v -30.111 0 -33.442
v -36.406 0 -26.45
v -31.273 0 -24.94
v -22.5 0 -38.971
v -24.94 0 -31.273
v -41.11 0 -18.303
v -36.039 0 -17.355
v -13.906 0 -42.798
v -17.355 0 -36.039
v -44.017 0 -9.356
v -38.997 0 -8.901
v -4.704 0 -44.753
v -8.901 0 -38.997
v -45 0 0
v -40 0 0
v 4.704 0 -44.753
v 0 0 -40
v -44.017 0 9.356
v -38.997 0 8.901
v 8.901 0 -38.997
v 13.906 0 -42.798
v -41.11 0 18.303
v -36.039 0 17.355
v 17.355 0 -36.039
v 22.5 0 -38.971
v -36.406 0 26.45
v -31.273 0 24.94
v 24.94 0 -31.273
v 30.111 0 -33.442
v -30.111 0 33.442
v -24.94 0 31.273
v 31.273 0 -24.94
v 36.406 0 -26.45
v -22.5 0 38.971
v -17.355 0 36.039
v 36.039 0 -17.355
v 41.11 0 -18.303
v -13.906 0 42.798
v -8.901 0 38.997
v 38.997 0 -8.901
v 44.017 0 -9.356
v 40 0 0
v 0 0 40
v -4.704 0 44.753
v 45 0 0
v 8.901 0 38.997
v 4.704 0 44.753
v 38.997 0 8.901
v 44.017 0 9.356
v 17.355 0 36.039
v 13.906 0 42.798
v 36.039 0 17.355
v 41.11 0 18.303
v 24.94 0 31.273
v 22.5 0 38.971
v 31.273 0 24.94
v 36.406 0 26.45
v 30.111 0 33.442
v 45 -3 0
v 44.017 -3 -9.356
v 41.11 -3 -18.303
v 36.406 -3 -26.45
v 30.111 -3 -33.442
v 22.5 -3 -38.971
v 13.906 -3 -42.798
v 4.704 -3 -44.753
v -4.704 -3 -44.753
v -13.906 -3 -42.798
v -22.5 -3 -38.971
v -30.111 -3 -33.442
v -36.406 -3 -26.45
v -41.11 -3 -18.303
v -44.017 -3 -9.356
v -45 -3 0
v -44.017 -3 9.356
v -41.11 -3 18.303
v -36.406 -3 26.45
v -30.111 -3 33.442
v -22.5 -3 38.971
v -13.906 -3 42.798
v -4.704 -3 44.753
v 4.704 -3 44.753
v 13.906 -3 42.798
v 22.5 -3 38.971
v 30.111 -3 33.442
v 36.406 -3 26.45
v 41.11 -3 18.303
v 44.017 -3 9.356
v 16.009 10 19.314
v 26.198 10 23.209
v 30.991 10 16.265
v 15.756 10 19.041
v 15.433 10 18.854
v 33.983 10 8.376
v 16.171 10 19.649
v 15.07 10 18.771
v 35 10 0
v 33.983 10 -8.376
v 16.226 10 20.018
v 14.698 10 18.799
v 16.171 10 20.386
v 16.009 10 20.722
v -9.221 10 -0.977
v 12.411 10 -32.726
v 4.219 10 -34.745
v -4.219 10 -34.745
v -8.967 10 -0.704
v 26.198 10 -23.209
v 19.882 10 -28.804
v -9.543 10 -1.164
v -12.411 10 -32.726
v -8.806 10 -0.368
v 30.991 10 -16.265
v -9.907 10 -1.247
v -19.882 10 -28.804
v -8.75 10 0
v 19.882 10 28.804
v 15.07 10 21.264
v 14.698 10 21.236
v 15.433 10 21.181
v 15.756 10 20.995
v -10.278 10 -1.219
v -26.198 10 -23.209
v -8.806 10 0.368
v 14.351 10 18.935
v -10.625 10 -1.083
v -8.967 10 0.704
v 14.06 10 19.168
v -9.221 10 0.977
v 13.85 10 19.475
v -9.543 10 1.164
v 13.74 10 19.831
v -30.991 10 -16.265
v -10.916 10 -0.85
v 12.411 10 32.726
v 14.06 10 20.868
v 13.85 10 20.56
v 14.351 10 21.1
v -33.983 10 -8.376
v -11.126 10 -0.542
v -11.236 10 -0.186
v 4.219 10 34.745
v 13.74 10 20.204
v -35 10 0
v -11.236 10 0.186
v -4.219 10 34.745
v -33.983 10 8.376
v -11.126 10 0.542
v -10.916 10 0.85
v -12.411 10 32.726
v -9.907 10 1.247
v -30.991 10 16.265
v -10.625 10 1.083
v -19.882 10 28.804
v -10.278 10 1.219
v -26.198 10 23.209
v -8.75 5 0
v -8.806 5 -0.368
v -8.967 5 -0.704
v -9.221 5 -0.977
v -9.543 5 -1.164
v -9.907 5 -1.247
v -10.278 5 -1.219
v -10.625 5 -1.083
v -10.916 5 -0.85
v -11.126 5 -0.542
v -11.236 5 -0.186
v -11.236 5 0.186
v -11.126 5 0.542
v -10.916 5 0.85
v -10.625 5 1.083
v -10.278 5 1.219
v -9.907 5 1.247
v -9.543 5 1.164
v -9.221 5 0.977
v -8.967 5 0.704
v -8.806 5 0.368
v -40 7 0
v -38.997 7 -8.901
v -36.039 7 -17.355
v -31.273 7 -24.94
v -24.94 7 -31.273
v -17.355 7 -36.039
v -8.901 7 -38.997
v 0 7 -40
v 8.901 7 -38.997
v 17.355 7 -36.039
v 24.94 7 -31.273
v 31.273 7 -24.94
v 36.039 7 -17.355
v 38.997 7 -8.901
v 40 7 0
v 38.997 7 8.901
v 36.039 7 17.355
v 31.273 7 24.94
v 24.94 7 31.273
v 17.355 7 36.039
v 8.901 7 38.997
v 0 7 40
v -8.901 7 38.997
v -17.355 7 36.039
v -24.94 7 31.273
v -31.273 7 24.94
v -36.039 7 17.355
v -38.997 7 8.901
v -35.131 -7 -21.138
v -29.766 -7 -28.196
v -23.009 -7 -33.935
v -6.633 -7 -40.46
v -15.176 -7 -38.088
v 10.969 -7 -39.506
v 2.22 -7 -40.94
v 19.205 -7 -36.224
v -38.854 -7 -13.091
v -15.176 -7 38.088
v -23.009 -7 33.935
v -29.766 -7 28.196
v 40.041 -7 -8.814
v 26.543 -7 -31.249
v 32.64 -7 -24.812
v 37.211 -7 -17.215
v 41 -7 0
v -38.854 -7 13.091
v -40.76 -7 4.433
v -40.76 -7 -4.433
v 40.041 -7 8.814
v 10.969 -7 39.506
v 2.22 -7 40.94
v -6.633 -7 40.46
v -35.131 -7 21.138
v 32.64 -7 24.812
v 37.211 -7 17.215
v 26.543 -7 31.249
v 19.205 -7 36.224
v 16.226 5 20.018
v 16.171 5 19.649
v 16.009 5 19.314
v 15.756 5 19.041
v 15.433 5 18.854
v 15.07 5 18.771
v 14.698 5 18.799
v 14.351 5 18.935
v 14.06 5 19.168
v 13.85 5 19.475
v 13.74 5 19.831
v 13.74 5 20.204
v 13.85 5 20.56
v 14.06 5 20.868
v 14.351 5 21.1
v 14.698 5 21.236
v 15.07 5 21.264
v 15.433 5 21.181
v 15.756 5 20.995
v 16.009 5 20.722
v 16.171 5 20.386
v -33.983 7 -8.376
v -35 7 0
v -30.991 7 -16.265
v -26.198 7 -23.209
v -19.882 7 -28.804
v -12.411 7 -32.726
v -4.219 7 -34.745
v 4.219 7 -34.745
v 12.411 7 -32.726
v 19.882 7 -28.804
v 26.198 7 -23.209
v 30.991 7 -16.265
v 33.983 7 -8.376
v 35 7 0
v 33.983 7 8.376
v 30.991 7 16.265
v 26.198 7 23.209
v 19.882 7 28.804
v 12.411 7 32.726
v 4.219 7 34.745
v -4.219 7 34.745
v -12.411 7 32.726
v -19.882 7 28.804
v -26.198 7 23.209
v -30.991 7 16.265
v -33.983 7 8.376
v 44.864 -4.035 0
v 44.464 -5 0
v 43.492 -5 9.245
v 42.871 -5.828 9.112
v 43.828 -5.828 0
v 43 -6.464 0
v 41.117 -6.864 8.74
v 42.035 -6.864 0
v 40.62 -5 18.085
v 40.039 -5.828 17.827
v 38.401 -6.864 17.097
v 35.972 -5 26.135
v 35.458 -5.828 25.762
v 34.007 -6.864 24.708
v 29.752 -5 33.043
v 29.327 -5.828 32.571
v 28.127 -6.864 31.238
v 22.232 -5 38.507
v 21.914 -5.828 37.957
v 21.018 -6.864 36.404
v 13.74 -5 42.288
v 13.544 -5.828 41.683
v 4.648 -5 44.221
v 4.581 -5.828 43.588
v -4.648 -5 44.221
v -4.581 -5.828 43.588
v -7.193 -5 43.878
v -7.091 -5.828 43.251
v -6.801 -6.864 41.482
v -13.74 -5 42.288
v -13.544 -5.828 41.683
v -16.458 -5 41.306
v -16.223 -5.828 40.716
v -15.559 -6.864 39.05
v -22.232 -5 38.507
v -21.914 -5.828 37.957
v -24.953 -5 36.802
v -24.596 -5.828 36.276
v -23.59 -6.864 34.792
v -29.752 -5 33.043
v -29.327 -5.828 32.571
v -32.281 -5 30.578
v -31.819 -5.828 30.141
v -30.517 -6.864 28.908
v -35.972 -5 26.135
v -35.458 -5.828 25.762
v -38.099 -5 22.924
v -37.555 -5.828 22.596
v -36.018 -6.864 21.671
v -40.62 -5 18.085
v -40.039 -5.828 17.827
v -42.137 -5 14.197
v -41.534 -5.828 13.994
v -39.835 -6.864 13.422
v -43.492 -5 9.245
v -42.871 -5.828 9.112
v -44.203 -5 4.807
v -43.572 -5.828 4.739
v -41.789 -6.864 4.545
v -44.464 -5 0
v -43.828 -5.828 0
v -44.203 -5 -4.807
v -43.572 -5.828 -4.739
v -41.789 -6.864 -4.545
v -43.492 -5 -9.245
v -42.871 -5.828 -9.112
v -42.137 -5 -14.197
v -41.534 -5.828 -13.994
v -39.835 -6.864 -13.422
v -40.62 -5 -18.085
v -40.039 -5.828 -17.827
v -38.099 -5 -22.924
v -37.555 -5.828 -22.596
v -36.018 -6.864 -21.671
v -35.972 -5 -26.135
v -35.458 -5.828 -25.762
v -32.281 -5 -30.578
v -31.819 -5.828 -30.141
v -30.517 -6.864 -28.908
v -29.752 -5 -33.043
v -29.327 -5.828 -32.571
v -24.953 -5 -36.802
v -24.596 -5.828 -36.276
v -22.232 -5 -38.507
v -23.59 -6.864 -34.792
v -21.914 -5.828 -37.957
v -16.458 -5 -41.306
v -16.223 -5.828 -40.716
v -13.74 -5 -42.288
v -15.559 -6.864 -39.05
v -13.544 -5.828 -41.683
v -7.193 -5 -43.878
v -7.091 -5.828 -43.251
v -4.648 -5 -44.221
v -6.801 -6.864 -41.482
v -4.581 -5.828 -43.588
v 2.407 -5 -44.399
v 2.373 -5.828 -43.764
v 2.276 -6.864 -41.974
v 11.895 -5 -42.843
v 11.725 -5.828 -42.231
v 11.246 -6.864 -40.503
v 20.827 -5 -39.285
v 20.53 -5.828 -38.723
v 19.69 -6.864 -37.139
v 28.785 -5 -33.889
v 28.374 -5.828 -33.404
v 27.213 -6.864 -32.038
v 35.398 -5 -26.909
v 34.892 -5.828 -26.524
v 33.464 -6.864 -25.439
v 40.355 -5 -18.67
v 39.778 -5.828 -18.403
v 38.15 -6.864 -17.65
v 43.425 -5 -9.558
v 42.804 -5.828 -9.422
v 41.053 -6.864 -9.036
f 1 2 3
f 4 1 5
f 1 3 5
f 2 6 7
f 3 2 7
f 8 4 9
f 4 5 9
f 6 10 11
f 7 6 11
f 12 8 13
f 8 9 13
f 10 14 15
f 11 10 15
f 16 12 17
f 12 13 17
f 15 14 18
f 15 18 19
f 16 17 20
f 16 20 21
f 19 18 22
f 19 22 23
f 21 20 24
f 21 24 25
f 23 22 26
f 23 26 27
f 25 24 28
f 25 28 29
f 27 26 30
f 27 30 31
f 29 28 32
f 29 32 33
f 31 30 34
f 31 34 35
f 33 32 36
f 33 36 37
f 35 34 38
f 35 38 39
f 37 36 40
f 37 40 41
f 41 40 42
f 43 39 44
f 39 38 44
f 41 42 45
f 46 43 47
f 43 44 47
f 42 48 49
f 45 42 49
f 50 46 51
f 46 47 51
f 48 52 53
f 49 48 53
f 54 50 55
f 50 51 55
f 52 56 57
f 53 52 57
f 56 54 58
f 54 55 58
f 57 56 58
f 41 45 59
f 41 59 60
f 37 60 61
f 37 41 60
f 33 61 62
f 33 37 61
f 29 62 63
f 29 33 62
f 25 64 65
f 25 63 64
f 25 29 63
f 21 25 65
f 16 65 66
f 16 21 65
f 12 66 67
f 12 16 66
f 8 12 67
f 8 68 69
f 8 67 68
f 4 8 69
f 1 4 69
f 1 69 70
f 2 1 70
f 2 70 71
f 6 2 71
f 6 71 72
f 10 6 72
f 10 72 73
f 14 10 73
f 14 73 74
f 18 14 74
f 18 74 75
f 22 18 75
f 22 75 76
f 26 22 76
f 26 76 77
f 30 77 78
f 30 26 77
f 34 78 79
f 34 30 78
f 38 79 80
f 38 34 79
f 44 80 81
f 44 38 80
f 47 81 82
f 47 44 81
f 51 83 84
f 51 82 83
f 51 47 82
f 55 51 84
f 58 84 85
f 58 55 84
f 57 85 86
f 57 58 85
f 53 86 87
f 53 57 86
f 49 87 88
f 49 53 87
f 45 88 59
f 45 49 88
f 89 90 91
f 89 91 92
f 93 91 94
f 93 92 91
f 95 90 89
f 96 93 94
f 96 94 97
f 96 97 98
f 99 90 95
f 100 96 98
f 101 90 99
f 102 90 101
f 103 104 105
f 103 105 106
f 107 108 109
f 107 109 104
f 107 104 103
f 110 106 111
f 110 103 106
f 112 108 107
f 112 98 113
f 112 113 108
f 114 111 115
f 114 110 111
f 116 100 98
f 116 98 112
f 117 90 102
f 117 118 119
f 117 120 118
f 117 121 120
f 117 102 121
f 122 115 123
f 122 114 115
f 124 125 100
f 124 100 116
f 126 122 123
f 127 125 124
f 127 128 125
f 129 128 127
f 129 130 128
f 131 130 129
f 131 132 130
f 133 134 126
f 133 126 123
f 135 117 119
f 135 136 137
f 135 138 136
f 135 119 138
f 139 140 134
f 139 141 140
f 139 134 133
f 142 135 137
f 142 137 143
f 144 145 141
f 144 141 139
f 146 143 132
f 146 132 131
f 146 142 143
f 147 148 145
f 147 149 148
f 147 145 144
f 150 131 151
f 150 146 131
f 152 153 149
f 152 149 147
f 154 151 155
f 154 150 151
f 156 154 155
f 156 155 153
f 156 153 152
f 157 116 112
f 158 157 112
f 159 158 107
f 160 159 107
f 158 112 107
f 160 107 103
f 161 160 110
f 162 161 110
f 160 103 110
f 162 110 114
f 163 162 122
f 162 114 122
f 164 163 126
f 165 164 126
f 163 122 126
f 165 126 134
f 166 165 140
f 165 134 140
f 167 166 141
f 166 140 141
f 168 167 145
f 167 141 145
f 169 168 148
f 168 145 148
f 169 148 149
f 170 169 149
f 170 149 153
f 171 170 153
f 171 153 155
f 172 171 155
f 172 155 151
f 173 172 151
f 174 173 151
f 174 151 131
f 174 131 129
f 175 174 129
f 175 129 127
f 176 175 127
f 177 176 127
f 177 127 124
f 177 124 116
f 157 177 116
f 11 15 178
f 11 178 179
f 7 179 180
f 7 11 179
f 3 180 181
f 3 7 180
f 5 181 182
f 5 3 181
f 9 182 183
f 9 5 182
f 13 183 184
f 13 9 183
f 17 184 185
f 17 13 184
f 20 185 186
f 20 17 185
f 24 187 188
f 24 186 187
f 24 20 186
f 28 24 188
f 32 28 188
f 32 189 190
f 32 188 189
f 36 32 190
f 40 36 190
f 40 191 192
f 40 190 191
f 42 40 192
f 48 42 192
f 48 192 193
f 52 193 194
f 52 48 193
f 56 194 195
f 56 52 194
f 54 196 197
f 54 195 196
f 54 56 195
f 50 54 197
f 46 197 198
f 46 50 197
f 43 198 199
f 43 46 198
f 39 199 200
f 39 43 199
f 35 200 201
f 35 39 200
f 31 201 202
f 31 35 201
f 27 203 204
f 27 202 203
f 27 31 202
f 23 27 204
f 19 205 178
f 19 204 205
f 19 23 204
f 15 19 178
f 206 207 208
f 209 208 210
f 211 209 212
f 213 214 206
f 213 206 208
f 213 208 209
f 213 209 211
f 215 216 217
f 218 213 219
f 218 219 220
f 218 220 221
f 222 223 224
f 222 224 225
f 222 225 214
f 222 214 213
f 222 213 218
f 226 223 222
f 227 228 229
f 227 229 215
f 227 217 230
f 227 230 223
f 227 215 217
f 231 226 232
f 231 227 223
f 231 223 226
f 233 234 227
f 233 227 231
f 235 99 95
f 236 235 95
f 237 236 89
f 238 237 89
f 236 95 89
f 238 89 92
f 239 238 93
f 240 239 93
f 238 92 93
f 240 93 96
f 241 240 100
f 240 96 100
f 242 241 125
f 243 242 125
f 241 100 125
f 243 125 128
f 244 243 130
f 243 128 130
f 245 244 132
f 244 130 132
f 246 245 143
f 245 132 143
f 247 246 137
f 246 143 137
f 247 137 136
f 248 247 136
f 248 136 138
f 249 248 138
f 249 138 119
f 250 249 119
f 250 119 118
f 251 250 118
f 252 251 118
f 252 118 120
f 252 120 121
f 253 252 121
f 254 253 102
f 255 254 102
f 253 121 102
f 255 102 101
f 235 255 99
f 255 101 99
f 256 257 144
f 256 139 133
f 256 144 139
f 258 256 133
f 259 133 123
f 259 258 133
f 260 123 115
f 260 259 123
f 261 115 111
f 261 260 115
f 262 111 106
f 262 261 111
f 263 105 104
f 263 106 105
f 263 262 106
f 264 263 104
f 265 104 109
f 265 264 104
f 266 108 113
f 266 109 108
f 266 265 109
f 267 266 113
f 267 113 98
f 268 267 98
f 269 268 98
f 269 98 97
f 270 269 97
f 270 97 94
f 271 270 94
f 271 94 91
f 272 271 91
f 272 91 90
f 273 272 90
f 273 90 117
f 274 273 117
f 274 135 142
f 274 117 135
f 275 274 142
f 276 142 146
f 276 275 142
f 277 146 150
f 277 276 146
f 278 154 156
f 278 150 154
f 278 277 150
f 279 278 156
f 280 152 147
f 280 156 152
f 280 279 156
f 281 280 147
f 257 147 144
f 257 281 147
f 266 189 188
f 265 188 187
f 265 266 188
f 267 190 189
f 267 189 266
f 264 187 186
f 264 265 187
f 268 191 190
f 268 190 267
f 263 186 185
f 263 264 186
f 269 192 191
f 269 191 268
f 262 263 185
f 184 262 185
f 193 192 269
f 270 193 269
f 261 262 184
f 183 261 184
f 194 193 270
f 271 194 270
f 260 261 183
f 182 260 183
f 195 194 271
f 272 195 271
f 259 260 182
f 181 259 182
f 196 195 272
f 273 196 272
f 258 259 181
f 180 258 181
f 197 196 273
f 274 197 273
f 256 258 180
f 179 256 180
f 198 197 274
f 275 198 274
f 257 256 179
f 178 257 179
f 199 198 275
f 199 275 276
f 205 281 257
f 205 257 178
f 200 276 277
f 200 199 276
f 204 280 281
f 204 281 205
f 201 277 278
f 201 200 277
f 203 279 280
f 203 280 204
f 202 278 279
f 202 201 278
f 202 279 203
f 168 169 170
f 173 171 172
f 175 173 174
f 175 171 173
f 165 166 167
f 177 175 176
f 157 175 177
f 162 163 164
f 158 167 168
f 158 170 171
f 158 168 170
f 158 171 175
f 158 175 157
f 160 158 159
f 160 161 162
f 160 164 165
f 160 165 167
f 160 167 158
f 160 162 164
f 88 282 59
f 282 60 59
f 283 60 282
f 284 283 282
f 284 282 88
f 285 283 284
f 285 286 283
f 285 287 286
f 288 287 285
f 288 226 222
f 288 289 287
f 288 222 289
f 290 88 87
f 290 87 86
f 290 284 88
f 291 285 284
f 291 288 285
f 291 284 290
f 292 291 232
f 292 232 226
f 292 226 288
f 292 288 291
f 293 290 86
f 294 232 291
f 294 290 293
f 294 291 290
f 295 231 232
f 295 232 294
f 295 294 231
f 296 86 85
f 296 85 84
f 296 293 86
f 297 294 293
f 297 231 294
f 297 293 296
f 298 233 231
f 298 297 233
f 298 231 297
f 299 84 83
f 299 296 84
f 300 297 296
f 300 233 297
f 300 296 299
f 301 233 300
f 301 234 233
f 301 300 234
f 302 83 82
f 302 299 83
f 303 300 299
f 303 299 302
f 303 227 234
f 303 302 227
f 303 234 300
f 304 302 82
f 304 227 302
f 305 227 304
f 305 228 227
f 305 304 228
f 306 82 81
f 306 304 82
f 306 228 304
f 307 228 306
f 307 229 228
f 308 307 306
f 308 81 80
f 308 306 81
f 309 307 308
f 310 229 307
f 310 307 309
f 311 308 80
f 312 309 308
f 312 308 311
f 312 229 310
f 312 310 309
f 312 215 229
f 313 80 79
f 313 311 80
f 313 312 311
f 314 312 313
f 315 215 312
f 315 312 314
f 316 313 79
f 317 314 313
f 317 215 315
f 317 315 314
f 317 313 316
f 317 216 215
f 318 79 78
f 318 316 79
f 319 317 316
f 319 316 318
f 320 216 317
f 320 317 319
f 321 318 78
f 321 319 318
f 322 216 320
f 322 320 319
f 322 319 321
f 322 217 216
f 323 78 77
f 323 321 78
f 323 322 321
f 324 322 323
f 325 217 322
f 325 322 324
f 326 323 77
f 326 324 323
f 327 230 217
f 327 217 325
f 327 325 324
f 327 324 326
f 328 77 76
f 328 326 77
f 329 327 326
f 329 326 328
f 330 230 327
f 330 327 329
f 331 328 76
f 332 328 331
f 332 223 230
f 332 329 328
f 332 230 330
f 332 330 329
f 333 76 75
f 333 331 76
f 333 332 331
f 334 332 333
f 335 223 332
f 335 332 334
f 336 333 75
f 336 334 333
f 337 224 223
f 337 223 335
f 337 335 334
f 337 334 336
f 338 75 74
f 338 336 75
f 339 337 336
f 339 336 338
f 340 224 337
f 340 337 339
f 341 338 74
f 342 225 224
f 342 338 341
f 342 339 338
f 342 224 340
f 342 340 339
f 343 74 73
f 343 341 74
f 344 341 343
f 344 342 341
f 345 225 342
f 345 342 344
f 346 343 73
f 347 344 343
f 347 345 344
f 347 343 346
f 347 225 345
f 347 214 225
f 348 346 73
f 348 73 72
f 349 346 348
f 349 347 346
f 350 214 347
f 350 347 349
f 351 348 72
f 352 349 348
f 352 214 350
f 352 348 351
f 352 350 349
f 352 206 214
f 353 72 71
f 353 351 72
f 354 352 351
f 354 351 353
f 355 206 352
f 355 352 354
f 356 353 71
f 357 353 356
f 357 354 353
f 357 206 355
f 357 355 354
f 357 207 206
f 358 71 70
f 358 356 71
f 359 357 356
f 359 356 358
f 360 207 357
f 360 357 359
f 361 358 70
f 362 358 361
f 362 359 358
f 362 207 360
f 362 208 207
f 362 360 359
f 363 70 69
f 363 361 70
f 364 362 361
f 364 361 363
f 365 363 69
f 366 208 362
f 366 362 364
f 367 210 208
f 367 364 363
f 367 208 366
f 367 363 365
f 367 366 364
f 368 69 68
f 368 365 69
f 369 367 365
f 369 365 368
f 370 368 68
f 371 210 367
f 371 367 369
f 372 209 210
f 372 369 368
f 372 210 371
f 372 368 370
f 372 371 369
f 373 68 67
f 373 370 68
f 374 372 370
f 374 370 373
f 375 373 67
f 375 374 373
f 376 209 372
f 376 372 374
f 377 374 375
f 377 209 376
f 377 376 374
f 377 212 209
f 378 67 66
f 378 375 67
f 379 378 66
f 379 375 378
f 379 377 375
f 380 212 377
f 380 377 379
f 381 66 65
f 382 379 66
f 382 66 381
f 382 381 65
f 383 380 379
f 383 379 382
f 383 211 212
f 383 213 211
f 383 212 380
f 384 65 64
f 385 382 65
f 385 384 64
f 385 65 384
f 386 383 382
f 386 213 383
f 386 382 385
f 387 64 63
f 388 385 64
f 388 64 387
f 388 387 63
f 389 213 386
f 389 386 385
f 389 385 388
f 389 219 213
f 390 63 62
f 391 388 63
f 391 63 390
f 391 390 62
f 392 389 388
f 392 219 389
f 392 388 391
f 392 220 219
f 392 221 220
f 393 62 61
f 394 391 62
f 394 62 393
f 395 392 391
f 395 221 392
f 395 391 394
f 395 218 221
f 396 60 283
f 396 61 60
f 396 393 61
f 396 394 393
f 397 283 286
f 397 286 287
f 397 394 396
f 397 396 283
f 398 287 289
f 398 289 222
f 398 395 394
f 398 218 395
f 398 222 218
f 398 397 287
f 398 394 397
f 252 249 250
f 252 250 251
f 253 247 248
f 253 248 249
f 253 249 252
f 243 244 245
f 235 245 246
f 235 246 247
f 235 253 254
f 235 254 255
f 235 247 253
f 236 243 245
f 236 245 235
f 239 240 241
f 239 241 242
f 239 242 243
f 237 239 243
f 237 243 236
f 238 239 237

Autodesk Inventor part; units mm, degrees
ref_plane "YZ Plane" through (0, 0, 0) normal (1, 0, 0) x (0, 1, 0)
ref_plane "XZ Plane" through (0, 0, 0) normal (0, 1, 0) x (-1, 0, 0)
ref_plane "XY Plane" through (0, 0, 0) normal (0, 0, 1) x (1, 0, 0)
sketch "Sketch1" plane through (0, 0, 0) normal (0, 1, 0) x (-1, 0, 0)
  circle A0 centre (0, 0) radius 40
  circle A1 centre (0, 0) radius 35
  dimension "d0" = 80
  dimension "d1" = 70
extrude "Extrusion1" add sketch "Sketch1" along normal blind 10 contours A1
extrude "Extrusion2" add sketch "Sketch1" along normal blind 7
sketch "Sketch3" plane through (0, 0, 0) normal (0, -1, 0) x (1, 0, 0)
  circle A0 centre (0, 0) radius 45
  dimension "d14" = 90
extrude "Extrusion4" add sketch "Sketch3" along normal blind 7
fillet "Fillet1" radius 4 1 edges at (-45, -7, 0)
sketch "Sketch4" plane through (0, 10, 0) normal (0, 1, 0) x (1, 0, 0)
  circle A0 centre (14.9762, -20.0178) radius 12
  circle A1 centre (-10, 0) radius 27
  circle A2 centre (14.9762, -20.0178) radius 1.25
  circle A3 centre (-10, 0) radius 1.25
  point P0 (0, 0)
  dimension "d24" = 24
  dimension "d25" = 54
  dimension "d26" = 10
  dimension "d27" = 2.5
  dimension "d28" = 2.5
  dimension "d31" = 25
extrude "Extrusion5" cut sketch "Sketch4" against normal blind 5 contours A2 | A3
properties part number "Cap"
